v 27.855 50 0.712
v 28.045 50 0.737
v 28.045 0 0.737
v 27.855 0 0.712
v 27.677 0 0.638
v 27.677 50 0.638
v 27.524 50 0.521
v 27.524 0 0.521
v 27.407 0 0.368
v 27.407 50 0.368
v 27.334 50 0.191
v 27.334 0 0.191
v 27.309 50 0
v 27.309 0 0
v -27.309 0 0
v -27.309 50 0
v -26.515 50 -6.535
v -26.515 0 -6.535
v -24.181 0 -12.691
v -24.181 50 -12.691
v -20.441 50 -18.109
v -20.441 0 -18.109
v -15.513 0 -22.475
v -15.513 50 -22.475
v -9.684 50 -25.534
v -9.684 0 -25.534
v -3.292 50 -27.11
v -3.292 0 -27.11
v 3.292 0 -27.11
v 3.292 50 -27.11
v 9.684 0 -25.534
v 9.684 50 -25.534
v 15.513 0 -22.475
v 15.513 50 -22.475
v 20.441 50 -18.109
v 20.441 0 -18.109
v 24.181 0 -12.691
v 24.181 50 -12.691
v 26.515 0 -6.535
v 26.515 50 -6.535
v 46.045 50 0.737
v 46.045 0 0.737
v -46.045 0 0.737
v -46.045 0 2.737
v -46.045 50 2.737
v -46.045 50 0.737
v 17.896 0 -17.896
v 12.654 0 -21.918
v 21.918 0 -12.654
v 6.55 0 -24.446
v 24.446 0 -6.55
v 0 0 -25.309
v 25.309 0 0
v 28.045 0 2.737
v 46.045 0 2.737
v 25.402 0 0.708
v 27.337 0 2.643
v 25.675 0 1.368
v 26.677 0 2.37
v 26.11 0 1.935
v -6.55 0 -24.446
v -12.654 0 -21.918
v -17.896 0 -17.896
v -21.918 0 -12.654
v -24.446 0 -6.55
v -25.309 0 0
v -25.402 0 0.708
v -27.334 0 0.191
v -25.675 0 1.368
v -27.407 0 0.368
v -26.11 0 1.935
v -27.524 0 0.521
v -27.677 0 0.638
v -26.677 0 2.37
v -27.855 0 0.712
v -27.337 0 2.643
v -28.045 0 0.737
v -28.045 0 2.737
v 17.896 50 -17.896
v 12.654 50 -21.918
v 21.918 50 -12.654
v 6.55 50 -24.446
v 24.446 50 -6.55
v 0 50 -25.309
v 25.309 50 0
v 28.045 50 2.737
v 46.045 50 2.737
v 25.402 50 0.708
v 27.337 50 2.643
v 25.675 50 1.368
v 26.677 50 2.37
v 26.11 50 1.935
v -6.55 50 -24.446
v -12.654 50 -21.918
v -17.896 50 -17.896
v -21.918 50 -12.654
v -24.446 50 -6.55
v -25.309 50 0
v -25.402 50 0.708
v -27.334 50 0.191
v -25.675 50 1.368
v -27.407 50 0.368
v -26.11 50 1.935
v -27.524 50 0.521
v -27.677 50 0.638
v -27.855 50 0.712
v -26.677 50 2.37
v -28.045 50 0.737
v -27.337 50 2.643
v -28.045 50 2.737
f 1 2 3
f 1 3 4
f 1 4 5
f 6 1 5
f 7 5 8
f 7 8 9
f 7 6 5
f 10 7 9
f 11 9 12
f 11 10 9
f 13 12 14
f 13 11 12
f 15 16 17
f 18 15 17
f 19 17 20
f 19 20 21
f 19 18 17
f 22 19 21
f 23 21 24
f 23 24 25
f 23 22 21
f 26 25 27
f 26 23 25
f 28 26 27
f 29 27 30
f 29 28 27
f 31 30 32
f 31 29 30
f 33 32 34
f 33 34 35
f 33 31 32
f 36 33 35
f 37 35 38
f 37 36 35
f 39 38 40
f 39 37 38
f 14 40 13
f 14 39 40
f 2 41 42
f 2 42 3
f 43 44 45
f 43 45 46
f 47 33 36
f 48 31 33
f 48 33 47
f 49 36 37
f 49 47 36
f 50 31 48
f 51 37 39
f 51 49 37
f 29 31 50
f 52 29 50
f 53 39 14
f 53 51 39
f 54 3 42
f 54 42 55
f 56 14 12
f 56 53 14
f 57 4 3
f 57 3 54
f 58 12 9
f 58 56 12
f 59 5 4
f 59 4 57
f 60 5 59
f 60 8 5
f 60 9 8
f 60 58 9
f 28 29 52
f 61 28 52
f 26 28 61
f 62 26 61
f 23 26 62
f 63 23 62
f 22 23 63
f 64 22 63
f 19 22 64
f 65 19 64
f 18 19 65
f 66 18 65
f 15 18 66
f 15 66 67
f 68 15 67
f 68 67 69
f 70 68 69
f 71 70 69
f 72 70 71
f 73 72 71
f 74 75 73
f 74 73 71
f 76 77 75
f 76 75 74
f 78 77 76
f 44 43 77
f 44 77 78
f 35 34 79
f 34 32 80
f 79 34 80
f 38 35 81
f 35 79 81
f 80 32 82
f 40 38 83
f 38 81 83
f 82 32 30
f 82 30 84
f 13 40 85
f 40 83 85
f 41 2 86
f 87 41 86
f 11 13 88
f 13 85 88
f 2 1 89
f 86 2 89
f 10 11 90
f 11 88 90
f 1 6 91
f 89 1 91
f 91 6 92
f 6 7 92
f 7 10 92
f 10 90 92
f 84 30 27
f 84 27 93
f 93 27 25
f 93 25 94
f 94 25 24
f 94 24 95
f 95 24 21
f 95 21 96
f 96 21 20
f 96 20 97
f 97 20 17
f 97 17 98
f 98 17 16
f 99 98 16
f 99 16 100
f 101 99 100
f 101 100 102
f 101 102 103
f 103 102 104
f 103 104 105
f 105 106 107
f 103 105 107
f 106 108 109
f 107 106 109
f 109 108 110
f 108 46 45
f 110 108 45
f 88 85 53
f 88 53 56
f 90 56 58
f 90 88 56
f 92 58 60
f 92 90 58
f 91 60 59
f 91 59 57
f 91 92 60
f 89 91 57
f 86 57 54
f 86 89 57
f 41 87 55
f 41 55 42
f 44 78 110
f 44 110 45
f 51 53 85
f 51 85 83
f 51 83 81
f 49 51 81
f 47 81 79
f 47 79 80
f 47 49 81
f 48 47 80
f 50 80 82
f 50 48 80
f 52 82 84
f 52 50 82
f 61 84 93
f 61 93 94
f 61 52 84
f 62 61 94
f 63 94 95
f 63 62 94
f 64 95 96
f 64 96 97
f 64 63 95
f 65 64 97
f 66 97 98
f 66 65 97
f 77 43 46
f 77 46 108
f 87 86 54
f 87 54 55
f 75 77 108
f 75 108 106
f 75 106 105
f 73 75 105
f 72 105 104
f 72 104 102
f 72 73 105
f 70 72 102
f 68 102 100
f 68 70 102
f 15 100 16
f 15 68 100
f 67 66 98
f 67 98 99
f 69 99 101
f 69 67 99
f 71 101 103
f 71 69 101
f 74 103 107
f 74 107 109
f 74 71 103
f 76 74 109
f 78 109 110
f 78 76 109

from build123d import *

# Parameters (mm, degrees)
BASE_FLANGE1_DEPTH      = 50
EDGE_FLANGE1_DEPTH      = 50
EDGE_FLANGE1_BEND_DEPTH = 50


# Sheet-metal steps are written as plain solids
with BuildPart() as part:
    # Sketch1 → Base-Flange1 (new body)
    with BuildSketch(Plane(origin=(0, 0, 0), x_dir=(1, 0, 0), z_dir=(0, 1, 0))):
        with BuildLine():
            ThreePointArc((25.308741749, 0), (0, 25.308741749), (-25.308741749, 0))
            Line((-25.308741749, 0), (-27.308741749, 0))
            ThreePointArc((-27.308741749, 0), (0, 27.308741749), (27.308741749, 0))
            Line((27.308741749, 0), (25.308741749, 0))
        make_face()
    extrude(amount=BASE_FLANGE1_DEPTH)

    # Edge-Flange1 section (across the edge) → Edge-Flange1 (add)
    with BuildSketch(Plane(origin=(27.308741749, 50, 0.7366), x_dir=(0, 0, -1), z_dir=(0, -1, 0))):
        with BuildLine():
            Line((-2, 0.7366), (-2, 18.7366))
            Line((-2, 18.7366), (0, 18.7366))
            Line((0, 18.7366), (0, 0.7366))
            ThreePointArc((0, 0.7366), (0.215745145, 0.215745145), (0.7366, 0))
            Line((0.7366, 0), (0.7366, -2))
            ThreePointArc((0.7366, -2), (-1.198468417, -1.198468417), (-2, 0.7366))
        make_face()
    extrude(amount=EDGE_FLANGE1_DEPTH)

    # Edge-Flange1 section 2 (across the edge) → Edge-Flange1 bend (add)
    with BuildSketch(Plane(origin=(-27.308741749, 0, 0.7366), x_dir=(0, 0, -1), z_dir=(0, 1, 0))):
        with BuildLine():
            Line((-2, 0.7366), (-2, 18.7366))
            Line((-2, 18.7366), (0, 18.7366))
            Line((0, 18.7366), (0, 0.7366))
            ThreePointArc((0, 0.7366), (0.215745145, 0.215745145), (0.7366, 0))
            Line((0.7366, 0), (0.7366, -2))
            ThreePointArc((0.7366, -2), (-1.198468417, -1.198468417), (-2, 0.7366))
        make_face()
    extrude(amount=EDGE_FLANGE1_BEND_DEPTH)


solid = part.part
